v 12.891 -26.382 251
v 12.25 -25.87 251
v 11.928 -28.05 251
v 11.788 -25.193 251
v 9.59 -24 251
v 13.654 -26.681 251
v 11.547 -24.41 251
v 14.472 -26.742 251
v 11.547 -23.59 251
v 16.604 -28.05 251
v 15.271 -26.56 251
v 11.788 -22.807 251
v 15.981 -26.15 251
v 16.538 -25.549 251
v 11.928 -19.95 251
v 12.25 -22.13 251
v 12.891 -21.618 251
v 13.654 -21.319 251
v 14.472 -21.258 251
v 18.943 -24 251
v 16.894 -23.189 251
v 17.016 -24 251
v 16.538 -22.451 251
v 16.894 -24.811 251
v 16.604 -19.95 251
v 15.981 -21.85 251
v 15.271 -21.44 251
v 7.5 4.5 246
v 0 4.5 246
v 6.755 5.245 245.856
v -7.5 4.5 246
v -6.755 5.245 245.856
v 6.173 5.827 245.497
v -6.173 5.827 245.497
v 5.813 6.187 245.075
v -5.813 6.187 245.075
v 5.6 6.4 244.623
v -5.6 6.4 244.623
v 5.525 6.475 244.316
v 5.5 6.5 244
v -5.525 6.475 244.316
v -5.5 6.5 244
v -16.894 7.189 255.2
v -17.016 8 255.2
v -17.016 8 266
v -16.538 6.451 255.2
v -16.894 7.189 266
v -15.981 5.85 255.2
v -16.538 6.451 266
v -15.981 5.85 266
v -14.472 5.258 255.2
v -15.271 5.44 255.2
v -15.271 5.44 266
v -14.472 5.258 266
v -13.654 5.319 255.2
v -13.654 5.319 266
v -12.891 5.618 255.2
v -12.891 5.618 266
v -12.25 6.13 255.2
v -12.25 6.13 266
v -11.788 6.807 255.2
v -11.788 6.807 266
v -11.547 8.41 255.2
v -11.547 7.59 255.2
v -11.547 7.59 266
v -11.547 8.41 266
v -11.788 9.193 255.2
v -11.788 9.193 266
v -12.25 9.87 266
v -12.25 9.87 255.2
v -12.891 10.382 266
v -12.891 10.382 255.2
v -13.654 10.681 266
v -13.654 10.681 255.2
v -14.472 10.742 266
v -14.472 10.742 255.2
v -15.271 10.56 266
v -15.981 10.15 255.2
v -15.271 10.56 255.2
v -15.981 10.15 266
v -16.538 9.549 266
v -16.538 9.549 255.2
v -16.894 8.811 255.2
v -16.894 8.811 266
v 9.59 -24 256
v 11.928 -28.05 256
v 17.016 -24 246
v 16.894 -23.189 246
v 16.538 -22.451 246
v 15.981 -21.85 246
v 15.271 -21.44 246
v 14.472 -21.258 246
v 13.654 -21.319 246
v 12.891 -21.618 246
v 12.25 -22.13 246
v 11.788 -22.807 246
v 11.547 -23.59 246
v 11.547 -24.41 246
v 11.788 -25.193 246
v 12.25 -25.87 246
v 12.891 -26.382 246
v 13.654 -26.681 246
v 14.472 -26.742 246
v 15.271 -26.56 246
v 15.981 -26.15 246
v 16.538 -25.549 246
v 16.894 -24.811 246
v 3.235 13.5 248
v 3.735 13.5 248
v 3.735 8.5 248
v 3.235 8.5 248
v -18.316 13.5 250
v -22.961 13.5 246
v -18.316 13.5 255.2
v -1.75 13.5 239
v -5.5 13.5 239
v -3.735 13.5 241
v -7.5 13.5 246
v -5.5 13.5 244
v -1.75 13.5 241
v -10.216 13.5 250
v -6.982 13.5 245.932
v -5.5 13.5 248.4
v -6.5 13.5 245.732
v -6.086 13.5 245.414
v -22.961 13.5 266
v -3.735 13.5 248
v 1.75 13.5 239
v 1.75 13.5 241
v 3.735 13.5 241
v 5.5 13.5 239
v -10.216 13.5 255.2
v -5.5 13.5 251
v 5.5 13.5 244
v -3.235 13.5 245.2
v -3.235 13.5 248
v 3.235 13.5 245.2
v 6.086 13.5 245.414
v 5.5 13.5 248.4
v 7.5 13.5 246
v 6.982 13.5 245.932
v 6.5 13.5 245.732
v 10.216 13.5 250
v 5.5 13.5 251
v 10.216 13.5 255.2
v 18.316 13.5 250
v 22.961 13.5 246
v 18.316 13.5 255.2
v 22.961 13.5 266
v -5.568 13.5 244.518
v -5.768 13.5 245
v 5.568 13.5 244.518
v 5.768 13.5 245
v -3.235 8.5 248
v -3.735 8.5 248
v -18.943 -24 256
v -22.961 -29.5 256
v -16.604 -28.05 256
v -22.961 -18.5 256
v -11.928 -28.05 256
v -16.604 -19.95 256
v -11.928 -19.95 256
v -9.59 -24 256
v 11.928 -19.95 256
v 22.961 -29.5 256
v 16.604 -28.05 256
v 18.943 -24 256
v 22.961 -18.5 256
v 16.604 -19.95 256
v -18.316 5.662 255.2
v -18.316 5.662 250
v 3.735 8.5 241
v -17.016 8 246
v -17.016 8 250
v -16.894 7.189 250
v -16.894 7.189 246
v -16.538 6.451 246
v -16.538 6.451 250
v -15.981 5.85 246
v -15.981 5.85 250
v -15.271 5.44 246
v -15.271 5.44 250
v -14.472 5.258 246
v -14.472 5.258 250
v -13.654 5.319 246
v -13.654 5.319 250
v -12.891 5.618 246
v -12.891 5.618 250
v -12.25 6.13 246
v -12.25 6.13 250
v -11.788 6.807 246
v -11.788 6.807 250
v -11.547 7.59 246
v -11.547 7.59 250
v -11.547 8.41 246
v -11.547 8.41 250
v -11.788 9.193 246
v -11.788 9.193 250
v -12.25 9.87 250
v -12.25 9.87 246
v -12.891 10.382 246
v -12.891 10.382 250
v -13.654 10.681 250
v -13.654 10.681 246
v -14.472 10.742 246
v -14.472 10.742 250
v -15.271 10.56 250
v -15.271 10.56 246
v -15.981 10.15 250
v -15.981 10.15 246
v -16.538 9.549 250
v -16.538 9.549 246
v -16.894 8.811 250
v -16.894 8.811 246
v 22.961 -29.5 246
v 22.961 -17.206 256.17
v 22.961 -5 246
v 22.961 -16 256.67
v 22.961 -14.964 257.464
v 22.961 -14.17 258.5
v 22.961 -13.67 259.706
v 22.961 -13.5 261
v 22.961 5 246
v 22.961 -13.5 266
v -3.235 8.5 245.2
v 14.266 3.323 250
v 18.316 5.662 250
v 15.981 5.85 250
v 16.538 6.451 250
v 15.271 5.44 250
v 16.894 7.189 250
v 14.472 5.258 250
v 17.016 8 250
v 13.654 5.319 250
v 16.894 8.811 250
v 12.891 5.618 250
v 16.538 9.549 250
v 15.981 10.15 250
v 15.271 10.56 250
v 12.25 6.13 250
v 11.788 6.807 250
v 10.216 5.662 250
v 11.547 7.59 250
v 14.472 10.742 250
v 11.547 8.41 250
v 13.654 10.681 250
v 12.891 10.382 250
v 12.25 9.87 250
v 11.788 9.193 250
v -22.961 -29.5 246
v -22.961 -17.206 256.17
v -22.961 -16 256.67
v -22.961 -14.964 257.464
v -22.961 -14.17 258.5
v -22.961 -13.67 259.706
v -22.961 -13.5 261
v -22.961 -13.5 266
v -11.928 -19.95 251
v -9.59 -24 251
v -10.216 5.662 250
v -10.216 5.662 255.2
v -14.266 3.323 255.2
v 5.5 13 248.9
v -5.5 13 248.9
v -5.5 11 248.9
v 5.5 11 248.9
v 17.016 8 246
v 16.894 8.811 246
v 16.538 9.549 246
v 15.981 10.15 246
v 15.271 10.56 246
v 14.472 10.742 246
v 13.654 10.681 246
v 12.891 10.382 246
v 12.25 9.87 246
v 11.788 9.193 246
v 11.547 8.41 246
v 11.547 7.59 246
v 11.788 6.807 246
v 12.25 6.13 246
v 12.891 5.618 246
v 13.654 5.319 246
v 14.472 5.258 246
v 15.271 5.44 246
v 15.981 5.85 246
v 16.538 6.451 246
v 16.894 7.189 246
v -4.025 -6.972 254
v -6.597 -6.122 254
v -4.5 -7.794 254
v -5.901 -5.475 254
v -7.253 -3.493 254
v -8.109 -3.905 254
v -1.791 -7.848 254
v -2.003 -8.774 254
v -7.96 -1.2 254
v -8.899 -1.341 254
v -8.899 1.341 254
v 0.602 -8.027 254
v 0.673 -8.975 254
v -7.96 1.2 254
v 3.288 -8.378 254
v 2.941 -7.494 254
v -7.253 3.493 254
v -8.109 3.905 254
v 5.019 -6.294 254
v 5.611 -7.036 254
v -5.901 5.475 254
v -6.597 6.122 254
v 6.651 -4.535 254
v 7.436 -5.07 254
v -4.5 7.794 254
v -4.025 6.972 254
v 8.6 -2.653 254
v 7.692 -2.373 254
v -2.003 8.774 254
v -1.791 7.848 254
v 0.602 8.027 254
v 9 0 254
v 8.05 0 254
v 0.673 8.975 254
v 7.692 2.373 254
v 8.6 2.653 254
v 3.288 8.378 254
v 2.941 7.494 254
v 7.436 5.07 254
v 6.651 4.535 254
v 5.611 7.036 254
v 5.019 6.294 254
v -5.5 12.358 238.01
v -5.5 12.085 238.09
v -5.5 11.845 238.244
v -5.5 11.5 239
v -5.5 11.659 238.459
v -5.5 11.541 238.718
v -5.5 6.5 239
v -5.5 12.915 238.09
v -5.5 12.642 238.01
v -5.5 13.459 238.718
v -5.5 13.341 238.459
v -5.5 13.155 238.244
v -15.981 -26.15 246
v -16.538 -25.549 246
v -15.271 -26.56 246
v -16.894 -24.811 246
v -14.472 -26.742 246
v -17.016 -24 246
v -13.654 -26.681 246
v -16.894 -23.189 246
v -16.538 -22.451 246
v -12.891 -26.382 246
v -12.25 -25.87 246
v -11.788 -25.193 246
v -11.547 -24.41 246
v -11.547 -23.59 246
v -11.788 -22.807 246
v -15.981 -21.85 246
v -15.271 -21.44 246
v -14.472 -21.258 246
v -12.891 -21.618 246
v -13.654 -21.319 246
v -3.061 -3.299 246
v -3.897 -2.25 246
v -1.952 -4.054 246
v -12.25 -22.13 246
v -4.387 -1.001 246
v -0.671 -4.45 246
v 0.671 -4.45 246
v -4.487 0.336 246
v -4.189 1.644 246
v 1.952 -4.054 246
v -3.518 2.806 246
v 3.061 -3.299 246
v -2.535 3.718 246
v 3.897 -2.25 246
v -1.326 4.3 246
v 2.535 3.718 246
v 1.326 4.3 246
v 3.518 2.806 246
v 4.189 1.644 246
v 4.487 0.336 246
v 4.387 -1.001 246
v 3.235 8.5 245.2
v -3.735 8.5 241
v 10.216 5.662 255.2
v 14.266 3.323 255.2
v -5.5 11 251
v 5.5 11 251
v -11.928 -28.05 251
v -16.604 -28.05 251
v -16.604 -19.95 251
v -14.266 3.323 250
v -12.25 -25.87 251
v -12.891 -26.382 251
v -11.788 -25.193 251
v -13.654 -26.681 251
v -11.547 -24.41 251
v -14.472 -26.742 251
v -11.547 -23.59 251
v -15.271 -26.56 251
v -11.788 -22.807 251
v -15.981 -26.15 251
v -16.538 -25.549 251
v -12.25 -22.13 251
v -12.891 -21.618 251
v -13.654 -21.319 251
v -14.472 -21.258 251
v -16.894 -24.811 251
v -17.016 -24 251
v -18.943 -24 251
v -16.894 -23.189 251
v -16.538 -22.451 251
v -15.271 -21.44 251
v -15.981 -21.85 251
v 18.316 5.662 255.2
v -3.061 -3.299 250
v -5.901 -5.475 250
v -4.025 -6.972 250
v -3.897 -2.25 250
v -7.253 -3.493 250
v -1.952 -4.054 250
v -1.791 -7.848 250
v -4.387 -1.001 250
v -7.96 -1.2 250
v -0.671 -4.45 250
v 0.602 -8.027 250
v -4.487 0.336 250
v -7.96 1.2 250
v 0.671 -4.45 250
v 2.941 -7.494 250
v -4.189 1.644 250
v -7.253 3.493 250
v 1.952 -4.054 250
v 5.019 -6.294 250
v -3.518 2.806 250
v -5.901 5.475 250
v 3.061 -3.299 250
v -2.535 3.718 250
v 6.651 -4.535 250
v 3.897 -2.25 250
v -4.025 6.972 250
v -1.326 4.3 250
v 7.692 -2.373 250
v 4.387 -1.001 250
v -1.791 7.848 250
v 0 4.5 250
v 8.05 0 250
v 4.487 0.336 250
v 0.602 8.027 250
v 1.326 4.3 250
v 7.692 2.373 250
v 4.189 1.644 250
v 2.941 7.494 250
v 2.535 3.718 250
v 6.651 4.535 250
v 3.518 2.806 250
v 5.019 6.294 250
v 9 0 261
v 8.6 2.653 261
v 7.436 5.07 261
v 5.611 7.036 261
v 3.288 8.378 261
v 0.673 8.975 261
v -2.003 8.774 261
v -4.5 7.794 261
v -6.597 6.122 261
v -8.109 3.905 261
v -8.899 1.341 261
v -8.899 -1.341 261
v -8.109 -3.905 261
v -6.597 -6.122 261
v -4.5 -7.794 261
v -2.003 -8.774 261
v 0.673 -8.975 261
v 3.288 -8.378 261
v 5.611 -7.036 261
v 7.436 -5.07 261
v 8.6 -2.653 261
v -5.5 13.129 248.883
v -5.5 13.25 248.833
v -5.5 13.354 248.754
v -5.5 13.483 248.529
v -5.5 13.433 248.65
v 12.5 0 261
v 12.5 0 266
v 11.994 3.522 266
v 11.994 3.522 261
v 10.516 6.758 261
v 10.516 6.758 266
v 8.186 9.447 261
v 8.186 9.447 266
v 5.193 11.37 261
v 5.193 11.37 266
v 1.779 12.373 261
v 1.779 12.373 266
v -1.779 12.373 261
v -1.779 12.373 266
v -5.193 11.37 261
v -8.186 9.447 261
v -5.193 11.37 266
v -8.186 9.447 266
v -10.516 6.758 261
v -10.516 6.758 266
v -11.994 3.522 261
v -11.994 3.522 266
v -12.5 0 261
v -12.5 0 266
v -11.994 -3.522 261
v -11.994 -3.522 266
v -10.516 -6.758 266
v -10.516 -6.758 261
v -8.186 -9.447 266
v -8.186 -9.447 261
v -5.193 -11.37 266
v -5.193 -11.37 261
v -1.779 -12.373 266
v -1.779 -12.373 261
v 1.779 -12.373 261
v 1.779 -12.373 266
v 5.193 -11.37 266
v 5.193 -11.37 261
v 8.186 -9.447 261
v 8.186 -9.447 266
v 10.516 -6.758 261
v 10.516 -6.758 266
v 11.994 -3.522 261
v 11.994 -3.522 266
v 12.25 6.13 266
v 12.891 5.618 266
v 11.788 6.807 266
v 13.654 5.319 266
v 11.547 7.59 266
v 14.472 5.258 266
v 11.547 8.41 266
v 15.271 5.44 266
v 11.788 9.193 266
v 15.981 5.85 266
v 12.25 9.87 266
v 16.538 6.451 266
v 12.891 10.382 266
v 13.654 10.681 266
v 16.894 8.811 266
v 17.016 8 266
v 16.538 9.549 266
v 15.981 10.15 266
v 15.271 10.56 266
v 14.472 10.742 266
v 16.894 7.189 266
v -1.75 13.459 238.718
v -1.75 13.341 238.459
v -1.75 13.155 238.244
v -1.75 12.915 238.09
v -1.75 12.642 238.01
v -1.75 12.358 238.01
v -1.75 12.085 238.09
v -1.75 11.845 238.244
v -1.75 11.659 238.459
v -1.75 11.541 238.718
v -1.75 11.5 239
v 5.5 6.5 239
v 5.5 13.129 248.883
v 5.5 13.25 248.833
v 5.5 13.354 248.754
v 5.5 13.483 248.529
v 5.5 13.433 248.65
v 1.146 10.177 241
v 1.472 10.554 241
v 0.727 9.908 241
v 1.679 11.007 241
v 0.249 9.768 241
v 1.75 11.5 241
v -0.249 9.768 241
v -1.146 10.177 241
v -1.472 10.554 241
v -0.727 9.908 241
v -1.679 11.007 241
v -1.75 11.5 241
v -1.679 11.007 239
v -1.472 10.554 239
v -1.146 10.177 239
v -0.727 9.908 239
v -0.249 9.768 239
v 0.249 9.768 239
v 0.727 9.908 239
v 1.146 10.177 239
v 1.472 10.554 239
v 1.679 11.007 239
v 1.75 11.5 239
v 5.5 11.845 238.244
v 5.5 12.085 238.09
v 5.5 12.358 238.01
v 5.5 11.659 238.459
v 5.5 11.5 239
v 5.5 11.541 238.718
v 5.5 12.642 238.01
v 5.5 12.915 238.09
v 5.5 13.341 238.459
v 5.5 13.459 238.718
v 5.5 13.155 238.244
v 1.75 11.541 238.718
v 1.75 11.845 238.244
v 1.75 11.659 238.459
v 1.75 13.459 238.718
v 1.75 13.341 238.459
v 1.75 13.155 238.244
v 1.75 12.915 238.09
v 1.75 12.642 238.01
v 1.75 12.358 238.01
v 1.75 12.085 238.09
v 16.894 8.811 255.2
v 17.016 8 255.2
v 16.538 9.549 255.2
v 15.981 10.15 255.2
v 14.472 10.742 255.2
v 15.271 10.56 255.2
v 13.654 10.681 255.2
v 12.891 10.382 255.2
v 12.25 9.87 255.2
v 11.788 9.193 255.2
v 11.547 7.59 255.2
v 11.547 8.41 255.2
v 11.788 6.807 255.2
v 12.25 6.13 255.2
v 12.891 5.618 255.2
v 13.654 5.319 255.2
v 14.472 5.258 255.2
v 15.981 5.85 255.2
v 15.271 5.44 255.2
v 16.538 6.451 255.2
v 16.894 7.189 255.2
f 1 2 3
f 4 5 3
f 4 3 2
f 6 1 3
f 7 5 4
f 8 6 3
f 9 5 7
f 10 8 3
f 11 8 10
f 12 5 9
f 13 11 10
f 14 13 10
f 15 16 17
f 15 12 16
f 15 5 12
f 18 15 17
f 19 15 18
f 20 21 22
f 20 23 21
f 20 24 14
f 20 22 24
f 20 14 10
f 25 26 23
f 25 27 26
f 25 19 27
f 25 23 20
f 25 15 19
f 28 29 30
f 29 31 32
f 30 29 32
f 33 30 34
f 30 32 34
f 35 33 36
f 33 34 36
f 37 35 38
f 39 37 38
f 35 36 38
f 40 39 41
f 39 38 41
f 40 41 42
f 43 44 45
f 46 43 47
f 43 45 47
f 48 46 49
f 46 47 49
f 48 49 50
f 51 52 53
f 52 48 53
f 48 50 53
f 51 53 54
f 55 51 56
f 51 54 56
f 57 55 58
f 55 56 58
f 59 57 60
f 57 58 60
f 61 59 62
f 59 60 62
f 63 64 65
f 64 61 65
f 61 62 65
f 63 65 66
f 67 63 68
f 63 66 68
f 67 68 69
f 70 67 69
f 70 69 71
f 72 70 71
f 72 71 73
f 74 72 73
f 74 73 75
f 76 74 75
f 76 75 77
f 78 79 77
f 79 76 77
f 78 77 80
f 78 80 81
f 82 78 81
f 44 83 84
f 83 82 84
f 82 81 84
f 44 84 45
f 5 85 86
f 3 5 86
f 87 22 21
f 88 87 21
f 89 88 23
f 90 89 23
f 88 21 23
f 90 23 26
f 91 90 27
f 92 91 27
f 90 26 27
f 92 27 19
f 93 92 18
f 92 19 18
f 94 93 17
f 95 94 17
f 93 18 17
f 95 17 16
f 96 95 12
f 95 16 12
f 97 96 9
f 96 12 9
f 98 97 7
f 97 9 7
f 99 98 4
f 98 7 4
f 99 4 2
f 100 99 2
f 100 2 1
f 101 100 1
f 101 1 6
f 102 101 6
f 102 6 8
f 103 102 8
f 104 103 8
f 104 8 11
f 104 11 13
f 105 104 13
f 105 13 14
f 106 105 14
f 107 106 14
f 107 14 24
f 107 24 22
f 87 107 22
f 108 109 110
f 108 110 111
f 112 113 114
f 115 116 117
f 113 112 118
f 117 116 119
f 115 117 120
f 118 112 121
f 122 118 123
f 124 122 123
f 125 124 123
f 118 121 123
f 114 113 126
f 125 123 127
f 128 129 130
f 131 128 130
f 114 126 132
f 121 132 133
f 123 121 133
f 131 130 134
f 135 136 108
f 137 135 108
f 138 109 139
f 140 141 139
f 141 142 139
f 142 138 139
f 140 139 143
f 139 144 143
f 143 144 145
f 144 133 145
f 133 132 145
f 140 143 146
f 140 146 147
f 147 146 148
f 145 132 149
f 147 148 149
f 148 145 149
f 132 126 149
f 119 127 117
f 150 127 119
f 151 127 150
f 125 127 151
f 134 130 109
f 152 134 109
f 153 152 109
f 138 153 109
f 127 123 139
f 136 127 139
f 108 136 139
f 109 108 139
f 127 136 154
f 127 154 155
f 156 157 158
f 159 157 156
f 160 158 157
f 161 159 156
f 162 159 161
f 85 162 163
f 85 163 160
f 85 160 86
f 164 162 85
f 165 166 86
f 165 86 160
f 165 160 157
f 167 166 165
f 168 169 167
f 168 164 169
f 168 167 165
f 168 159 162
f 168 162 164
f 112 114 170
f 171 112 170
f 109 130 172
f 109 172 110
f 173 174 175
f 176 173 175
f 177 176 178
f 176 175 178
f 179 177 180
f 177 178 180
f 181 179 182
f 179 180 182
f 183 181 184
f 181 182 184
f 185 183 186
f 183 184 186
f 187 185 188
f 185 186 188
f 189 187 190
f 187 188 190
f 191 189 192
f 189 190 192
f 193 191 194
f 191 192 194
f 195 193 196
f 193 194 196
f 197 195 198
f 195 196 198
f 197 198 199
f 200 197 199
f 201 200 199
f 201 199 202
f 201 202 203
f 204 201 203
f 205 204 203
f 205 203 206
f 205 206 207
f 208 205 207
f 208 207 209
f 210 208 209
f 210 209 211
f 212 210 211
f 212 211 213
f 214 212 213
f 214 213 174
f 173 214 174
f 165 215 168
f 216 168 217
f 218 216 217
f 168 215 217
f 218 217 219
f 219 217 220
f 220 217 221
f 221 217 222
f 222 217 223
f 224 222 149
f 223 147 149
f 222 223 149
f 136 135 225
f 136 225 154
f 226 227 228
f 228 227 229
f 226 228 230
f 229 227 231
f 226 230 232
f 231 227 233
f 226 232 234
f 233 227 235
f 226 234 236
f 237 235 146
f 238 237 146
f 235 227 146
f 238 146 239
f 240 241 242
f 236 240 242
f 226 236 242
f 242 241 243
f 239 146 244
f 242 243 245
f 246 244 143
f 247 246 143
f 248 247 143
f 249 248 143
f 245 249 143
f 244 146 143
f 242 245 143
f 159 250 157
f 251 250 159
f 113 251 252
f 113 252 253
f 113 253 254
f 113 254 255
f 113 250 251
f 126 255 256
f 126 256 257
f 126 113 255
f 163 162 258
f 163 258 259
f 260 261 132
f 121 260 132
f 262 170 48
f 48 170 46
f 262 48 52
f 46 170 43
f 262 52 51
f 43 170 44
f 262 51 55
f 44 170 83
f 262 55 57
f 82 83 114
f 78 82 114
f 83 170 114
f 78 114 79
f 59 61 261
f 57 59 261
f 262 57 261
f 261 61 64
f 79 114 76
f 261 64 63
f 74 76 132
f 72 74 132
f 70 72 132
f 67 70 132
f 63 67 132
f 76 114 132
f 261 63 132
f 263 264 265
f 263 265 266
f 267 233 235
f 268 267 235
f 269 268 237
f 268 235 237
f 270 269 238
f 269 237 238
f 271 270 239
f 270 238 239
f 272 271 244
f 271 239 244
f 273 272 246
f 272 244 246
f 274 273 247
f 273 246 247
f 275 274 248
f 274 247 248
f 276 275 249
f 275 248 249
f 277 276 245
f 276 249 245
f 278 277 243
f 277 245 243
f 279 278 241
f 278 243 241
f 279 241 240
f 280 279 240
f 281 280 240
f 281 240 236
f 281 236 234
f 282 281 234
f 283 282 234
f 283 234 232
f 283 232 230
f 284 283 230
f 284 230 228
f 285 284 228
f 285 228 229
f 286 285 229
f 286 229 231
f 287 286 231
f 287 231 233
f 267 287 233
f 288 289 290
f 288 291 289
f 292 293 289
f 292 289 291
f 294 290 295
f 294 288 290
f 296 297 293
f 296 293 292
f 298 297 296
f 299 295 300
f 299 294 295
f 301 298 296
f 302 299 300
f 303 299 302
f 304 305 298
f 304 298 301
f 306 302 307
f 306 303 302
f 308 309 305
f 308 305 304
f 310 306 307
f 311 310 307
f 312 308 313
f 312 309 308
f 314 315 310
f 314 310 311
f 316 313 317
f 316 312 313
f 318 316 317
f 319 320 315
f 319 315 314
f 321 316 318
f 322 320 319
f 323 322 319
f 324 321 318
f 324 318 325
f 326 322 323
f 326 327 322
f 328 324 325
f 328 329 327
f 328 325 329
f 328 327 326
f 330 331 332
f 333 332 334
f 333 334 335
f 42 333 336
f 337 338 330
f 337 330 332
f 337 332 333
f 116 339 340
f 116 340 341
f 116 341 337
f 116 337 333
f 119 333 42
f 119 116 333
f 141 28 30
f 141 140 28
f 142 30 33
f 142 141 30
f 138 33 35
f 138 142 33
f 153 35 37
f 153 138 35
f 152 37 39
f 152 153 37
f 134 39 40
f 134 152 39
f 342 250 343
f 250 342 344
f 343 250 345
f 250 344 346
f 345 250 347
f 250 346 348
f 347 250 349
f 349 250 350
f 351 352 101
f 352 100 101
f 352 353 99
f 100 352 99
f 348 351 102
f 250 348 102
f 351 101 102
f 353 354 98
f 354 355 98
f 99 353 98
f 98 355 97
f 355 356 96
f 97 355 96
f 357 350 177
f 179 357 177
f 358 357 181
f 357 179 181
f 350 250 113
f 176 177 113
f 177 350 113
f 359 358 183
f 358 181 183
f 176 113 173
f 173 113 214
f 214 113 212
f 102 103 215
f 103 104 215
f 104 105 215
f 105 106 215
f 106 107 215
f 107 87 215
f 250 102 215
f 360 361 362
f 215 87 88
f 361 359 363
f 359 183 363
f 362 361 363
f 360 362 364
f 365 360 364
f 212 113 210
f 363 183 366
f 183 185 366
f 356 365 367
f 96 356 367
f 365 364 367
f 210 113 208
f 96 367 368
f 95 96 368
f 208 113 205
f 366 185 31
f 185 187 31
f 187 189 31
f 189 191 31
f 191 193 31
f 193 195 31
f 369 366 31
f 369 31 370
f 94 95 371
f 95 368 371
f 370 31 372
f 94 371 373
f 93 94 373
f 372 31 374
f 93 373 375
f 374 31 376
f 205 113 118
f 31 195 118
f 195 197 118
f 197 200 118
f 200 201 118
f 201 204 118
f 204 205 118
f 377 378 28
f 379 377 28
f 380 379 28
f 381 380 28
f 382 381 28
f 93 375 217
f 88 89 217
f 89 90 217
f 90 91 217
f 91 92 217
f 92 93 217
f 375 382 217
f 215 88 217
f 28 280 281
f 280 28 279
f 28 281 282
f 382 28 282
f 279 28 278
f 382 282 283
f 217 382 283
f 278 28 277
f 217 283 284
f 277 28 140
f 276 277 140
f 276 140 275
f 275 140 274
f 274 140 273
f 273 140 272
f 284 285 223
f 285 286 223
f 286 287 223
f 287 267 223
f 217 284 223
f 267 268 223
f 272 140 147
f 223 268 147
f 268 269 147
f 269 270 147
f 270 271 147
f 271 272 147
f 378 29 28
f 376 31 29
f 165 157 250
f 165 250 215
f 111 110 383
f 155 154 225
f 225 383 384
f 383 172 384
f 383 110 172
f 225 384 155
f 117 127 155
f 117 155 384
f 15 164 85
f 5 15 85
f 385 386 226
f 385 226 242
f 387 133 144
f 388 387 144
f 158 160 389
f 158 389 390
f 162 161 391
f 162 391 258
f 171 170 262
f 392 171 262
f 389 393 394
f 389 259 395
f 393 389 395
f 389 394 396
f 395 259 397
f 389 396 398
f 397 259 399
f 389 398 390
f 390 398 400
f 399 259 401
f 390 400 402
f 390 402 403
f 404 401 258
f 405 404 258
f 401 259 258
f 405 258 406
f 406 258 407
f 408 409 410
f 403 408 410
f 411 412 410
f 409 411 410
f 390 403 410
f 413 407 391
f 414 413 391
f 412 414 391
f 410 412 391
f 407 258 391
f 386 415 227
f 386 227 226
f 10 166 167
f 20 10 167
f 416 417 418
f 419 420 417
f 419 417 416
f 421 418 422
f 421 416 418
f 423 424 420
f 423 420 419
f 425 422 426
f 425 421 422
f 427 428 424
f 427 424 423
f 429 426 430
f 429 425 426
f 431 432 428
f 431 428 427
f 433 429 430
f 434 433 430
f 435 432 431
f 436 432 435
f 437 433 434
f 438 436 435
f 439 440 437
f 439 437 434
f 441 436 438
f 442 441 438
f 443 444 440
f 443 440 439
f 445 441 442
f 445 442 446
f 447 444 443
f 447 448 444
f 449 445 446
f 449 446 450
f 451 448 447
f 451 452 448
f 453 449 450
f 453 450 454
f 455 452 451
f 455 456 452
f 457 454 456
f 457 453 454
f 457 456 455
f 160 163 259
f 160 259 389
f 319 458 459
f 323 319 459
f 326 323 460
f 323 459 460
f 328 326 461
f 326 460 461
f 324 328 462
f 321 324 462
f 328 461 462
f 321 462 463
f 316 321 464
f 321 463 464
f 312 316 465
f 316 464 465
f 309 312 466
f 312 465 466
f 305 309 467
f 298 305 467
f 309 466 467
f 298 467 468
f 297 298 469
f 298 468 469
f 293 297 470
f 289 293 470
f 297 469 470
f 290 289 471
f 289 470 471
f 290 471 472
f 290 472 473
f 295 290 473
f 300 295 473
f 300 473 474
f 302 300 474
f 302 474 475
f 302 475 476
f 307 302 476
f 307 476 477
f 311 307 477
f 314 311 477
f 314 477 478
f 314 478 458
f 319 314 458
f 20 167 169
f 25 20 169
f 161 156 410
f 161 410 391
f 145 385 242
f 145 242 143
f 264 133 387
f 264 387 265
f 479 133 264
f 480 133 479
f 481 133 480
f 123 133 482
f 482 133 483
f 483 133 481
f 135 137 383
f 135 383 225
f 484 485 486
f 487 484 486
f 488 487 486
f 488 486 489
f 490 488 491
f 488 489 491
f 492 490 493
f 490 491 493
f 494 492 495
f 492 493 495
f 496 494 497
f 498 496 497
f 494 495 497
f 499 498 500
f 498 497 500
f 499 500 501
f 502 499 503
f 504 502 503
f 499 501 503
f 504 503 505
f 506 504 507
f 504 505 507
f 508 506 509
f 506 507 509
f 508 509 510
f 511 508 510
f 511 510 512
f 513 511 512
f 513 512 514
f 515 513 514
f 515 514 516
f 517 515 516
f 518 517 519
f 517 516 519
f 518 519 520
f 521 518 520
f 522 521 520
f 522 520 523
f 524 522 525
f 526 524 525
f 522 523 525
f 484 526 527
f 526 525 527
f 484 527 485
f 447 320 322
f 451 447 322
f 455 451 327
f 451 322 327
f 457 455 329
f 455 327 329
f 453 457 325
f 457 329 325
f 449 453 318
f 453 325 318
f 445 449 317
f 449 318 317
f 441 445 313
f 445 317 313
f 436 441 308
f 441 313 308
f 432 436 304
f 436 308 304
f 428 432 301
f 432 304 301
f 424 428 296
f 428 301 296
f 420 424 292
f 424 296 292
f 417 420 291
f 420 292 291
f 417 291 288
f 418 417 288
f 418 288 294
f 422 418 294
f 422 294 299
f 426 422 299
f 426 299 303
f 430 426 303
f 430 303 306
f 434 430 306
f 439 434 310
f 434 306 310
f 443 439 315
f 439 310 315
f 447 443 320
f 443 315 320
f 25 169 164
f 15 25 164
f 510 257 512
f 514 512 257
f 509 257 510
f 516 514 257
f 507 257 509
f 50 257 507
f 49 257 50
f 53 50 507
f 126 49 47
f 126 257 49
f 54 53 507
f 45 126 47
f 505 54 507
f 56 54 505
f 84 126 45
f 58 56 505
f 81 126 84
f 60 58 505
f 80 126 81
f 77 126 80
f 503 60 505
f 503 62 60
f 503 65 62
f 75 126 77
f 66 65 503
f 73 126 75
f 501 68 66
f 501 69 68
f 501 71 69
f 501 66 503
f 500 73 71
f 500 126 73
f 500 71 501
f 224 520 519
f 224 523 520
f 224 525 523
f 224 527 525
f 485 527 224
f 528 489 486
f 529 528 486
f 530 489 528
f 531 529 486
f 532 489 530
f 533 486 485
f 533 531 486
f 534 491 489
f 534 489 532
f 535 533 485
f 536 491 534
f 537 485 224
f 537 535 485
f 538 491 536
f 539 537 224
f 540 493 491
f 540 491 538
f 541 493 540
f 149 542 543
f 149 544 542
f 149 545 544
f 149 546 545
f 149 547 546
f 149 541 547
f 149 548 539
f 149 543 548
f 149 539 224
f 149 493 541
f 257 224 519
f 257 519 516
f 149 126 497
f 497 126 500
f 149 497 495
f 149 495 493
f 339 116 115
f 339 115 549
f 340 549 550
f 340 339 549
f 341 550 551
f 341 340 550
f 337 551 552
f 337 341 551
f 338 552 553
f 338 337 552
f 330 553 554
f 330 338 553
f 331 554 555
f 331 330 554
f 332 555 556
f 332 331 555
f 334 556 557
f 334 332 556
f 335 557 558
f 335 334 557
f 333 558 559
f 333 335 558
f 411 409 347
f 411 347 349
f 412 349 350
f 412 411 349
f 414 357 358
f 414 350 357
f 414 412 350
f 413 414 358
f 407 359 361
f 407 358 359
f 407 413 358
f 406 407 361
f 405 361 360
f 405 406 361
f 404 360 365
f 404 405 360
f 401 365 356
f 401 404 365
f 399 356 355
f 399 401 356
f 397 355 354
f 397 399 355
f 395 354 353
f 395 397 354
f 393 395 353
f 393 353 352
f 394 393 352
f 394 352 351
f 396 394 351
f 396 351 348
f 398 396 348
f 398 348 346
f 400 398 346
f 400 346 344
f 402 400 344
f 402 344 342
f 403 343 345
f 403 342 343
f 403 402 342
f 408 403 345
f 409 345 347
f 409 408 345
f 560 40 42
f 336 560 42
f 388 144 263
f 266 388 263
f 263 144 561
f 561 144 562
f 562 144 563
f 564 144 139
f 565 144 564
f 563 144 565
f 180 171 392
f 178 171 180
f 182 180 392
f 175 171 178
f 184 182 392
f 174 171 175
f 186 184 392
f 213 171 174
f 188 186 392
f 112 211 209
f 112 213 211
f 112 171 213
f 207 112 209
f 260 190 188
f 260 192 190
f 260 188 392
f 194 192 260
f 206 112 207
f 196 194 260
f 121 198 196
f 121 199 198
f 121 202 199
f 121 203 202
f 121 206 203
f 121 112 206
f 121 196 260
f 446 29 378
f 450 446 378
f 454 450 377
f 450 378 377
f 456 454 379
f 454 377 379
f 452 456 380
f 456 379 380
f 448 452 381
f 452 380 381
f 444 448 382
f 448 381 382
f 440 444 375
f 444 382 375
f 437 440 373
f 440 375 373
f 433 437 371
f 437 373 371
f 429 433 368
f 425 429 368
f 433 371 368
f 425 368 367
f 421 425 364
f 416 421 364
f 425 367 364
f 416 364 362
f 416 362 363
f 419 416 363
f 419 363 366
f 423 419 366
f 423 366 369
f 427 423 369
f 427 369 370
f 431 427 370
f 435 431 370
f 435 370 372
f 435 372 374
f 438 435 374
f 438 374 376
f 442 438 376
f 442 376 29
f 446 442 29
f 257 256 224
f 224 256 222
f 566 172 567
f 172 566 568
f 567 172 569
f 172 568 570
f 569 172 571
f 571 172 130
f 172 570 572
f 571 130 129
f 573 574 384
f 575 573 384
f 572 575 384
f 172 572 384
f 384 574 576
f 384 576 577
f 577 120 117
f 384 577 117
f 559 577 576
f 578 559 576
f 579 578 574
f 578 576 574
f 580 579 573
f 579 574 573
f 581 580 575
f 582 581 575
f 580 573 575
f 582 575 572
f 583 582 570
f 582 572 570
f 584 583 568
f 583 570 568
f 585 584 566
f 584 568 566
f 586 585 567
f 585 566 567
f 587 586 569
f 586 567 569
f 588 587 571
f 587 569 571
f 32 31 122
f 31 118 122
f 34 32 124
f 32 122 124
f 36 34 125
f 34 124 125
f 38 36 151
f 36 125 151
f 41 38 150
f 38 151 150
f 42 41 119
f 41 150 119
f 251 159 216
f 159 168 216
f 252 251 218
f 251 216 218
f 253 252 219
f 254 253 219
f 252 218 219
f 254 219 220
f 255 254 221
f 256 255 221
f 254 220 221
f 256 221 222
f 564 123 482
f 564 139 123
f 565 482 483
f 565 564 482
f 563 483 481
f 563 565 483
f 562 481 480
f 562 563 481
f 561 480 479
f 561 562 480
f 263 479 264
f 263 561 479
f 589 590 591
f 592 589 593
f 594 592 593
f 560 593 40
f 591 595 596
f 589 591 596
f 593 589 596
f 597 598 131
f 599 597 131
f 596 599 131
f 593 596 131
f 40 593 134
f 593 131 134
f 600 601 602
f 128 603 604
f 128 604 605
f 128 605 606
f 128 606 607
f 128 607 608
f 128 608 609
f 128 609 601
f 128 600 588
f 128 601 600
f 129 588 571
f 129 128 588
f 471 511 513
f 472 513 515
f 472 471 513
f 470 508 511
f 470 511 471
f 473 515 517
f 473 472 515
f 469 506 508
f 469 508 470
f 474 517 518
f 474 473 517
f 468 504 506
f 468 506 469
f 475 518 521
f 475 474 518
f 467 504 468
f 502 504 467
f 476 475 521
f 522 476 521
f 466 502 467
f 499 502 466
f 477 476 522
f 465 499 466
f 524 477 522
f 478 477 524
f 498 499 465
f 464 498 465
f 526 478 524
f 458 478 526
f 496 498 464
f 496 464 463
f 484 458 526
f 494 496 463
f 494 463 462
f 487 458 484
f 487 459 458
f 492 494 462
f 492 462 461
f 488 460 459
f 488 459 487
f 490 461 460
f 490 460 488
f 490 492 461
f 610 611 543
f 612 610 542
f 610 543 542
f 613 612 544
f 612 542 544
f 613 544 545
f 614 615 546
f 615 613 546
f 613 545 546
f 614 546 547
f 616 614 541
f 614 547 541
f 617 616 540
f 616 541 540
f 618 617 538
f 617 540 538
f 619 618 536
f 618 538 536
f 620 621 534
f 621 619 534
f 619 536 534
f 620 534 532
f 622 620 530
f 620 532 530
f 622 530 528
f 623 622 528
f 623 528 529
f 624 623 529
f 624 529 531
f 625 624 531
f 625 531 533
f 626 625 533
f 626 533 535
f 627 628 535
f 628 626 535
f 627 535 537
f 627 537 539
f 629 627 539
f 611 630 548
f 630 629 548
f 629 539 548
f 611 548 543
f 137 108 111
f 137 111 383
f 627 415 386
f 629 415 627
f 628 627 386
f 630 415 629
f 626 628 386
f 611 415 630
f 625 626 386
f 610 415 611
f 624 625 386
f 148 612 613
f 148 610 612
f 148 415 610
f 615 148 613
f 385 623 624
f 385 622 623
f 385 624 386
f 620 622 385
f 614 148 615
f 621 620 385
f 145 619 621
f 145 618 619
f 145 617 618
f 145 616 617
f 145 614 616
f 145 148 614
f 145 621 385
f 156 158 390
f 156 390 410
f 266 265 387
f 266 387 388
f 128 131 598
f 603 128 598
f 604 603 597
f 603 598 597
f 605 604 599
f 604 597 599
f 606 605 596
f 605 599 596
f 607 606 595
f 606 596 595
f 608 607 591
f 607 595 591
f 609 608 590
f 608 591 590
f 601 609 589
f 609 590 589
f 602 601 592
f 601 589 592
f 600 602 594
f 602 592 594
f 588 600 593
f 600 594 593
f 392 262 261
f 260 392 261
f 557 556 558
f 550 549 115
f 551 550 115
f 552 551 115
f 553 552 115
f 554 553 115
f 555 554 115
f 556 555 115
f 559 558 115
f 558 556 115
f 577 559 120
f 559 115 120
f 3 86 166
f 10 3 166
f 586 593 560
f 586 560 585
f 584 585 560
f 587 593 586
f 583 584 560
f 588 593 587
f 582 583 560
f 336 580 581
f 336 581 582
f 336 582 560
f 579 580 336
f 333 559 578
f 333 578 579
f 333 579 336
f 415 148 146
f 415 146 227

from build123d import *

# Parameters (mm, degrees)
BOSS_EXTRUDE1_DEPTH      = 13.5
BOSS_EXTRUDE2_DEPTH      = 18.5
BOSS_EXTRUDE3_DEPTH      = 5
SKETCH4_W                = 45.922011884
SKETCH4_H                = 20
BOSS_EXTRUDE4_DEPTH      = 13.5
SKETCH2_R                = 4.25
CUT_EXTRUDE1_DEPTH       = 268.629329099
SKETCH6_R                = 9
CUT_EXTRUDE3_DEPTH       = 12
SKETCH7_R                = 12.5
CUT_EXTRUDE4_DEPTH       = 5
BOSS_EXTRUDE5_DEPTH      = 13.5
CUT_EXTRUDE5_REACH       = 210.1
SKETCH8_R                = 9
CUT_EXTRUDE6_REACH       = 210.1
SKETCH10_R               = 4
SKETCH11_R               = 8
CUT_EXTRUDE7_DEPTH       = 4
SKETCH18_R               = 11
CUT_EXTRUDE9_DEPTH       = 47
CUT_EXTRUDE11_DEPTH      = 268.629329099
CUT_EXTRUDE11_DEPTH_BACK = 268.629329099
SKETCH20_W               = 45.922011884
SKETCH20_H               = 204.425421037
SKETCH21_W               = 45.922011884
SKETCH21_H               = 10
BOSS_EXTRUDE6_DEPTH      = 16
M5_CLEARANCE_HOLE1_D     = 5.5
CUT_EXTRUDE12_DEPTH      = 5
FILLET1_R                = 5
LPATTERN2_COPY_1_D       = 5.5
LPATTERN2_COPY_2_D       = 5.5
CUT_EXTRUDE13_START      = -9.2
SKETCH25_R               = 2.75
CUT_EXTRUDE13_DEPTH      = 5.2
SKETCH26_R               = 8.05
CUT_EXTRUDE14_DEPTH      = 4
SKETCH27_W               = 11
SKETCH27_H               = 7
BOSS_EXTRUDE7_DEPTH      = 5
CUT_EXTRUDE15_DEPTH      = 5
FILLET2_R                = 2
BOSS_EXTRUDE8_DEPTH      = 2
BOSS_EXTRUDE9_DEPTH      = 3.75
SKETCH31_W               = 11
SKETCH31_H               = 2.1
CUT_EXTRUDE16_DEPTH      = 2.5
FILLET3_R                = 0.5
CUT_EXTRUDE17_REACH      = 44.396
SKETCH32_R               = 4.5


with BuildPart() as part:
    # Sketch1 → Boss-Extrude1 (new, symmetric)
    with BuildSketch(Plane(origin=(0, 0, 0), x_dir=(1, 0, 0), z_dir=(0, 1, 0))):
        with BuildLine():
            ThreePointArc((17.220754456, -41.574578963), (0, -45), (-17.220754456, -41.574578963))
            Line((-17.220754456, -41.574578963), (-22.961005942, -55.432771951))
            ThreePointArc((-22.961005942, -55.432771951), (0, -60), (22.961005942, -55.432771951))
            Line((22.961005942, -55.432771951), (17.220754456, -41.574578963))
        make_face()
    extrude(amount=BOSS_EXTRUDE1_DEPTH, both=True)

    # Sketch1<3> → Boss-Extrude2 (add, symmetric)
    with BuildSketch(Plane(origin=(0, 0, 0), x_dir=(1, 0, 0), z_dir=(0, 1, 0))):
        with BuildLine():
            ThreePointArc((19.134171618, -46.193976626), (0, -50), (-19.134171618, -46.193976626))
            Line((-19.134171618, -46.193976626), (-21.04758878, -50.813374288))
            ThreePointArc((-21.04758878, -50.813374288), (0, -55), (21.04758878, -50.813374288))
            Line((21.04758878, -50.813374288), (19.134171618, -46.193976626))
        make_face()
    extrude(amount=BOSS_EXTRUDE2_DEPTH, both=True)

    # Sketch3 → Boss-Extrude3 (add, symmetric)
    with BuildSketch(Plane.XZ):
        with BuildLine():
            Line((-22.961005942, 266), (-22.961005942, 55.432771951))
            ThreePointArc((-22.961005942, 55.432771951), (-20.481139434, 56.39612511), (-17.961005942, 57.248600555))
            Line((-17.961005942, 57.248600555), (-17.961005942, 246))
            Line((-17.961005942, 246), (17.961005942, 246))
            Line((17.961005942, 246), (17.961005942, 57.248600555))
            ThreePointArc((17.961005942, 57.248600555), (20.481139434, 56.39612511), (22.961005942, 55.432771951))
            Line((22.961005942, 55.432771951), (22.961005942, 266))
            Line((22.961005942, 266), (-22.961005942, 266))
        make_face()
    extrude(amount=BOSS_EXTRUDE3_DEPTH, both=True)

    # Sketch4 → Boss-Extrude4 (add, symmetric)
    with BuildSketch(Plane(origin=(0, 0, 0), x_dir=(1, 0, 0), z_dir=(0, 1, 0))):
        with Locations((0, -256)):
            Rectangle(SKETCH4_W, SKETCH4_H)
    extrude(amount=BOSS_EXTRUDE4_DEPTH, both=True)

    # Sketch2 → Cut-Extrude1 (cut, through all)
    with BuildSketch(Plane.XY):
        Circle(SKETCH2_R)
    extrude(amount=CUT_EXTRUDE1_DEPTH, mode=Mode.SUBTRACT)

    # Sketch6 → Cut-Extrude3 (cut)
    with BuildSketch(Plane.XY.offset(266)):
        Circle(SKETCH6_R)
    extrude(amount=-CUT_EXTRUDE3_DEPTH, mode=Mode.SUBTRACT)

    # Sketch7 → Cut-Extrude4 (cut)
    with BuildSketch(Plane.XY.offset(266)):
        Circle(SKETCH7_R)
    extrude(amount=-CUT_EXTRUDE4_DEPTH, mode=Mode.SUBTRACT)

    # Sketch9 → Boss-Extrude5 (add, symmetric)
    with BuildSketch(Plane(origin=(0, 0, 0), x_dir=(1, 0, 0), z_dir=(0, 1, 0))):
        with BuildLine():
            Line((-22.961005942, -55.432771951), (-22.961005942, -68))
            Line((-22.961005942, -68), (22.961005942, -68))
            Line((22.961005942, -68), (22.961005942, -55.432771951))
            ThreePointArc((22.961005942, -55.432771951), (0, -60), (-22.961005942, -55.432771951))
        make_face()
    extrude(amount=BOSS_EXTRUDE5_DEPTH, both=True)

    # Sketch8 → Cut-Extrude5 (cut, up to next)
    with BuildSketch(Plane.XY.offset(60), mode=Mode.PRIVATE) as cut_extrude5_sk1:
        Circle(SKETCH8_R)
    cut_extrude5_tool1 = extrude(cut_extrude5_sk1.sketch, amount=-CUT_EXTRUDE5_REACH, mode=Mode.PRIVATE) & part.part
    add(cut_extrude5_tool1.solids().sort_by_distance((0, 0, 60))[0], mode=Mode.SUBTRACT)

    # Sketch10 → Cut-Extrude6 (cut, up to next)
    with BuildSketch(Plane.XY.offset(60), mode=Mode.PRIVATE) as cut_extrude6_sk1:
        Circle(SKETCH10_R)
    cut_extrude6_tool1 = extrude(cut_extrude6_sk1.sketch, amount=CUT_EXTRUDE6_REACH, mode=Mode.PRIVATE) & part.part
    add(cut_extrude6_tool1.solids().sort_by_distance((0, 0, 60))[0], mode=Mode.SUBTRACT)

    # Sketch11 → Cut-Extrude7 (cut)
    with BuildSketch(Plane.XY.offset(68)):
        Circle(SKETCH11_R)
    extrude(amount=-CUT_EXTRUDE7_DEPTH, mode=Mode.SUBTRACT)

    # Sketch18 → Cut-Extrude9 (cut)
    with BuildSketch(Plane.XY):
        Circle(SKETCH18_R)
    extrude(amount=CUT_EXTRUDE9_DEPTH, mode=Mode.SUBTRACT)

    # Sketch20 → Cut-Extrude11 (cut, two sides: drawn at the far end of the back side and taken through both)
    with BuildSketch(Plane(origin=(0, 0, 0), x_dir=(1, 0, 0), z_dir=(0, 1, 0)).offset(-CUT_EXTRUDE11_DEPTH_BACK)):
        with Locations((0, -143.787289482)):
            Rectangle(SKETCH20_W, SKETCH20_H)
    extrude(amount=CUT_EXTRUDE11_DEPTH + CUT_EXTRUDE11_DEPTH_BACK, mode=Mode.SUBTRACT)

    # Sketch21 → Boss-Extrude6 (add)
    with BuildSketch(Plane.XZ.offset(13.5)):
        with Locations((0, 251)):
            Rectangle(SKETCH21_W, SKETCH21_H)
    extrude(amount=BOSS_EXTRUDE6_DEPTH)

    # M5 Clearance Hole1 (through all)
    with Locations(Plane(origin=(0, 0, 246), x_dir=(-1, 0, 0), z_dir=(0, 0, -1))):
        with Locations((-14.26606865, -24)):
            m5_clearance_hole1 = Hole(M5_CLEARANCE_HOLE1_D / 2)

    # Sketch24 → Cut-Extrude12 (cut)
    with BuildSketch(Plane.XY.offset(256)):
        Polygon((18.94260583, -24), (16.60433724, -19.95), (11.92780006, -19.95), (9.58953147, -24), (11.92780006, -28.05), (16.60433724, -28.05), align=None)
    cut_extrude12 = extrude(amount=-CUT_EXTRUDE12_DEPTH, mode=Mode.SUBTRACT)

    # Mirror1: M5 Clearance Hole1 across plane
    add(m5_clearance_hole1.mirror(Plane(origin=(0, 0, 0), x_dir=(0, 0, 1), z_dir=(1, 0, 0))), mode=Mode.SUBTRACT)

    # Mirror2: Cut-Extrude12 across plane
    add(cut_extrude12.mirror(Plane(origin=(0, 0, 0), x_dir=(0, 0, 1), z_dir=(1, 0, 0))), mode=Mode.SUBTRACT)

    # Fillet1
    fillet1_edges = [part.edges().sort_by_distance(p)[0] for p in [
        (0, -13.5, 256),
    ]]
    fillet(fillet1_edges, radius=FILLET1_R)

    # LPattern2 copy 1 (through all)
    with Locations(Plane(origin=(0, 32, 246), x_dir=(1, 0, 0), z_dir=(0, 0, -1))):
        with Locations((-14.26606865, 24)):
            Hole(LPATTERN2_COPY_1_D / 2)

    # LPattern2 copy 2 (through all)
    with Locations(Plane(origin=(0, 32, 246), x_dir=(-1, 0, 0), z_dir=(0, 0, -1))):
        with Locations((-14.26606865, -24)):
            Hole(LPATTERN2_COPY_2_D / 2)

    # Sketch25 → Cut-Extrude13 (cut)
    with BuildSketch(Plane(origin=(0, 0, 246), x_dir=(-1, 0, 0), z_dir=(0, 0, -1)).offset(CUT_EXTRUDE13_START)):
        Polygon((-10.21606865, 5.66173141), (-10.21606865, 13.5), (-18.31606865, 13.5), (-18.31606865, 5.66173141), (-14.26606865, 3.32346282), align=None)
        with Locations((-14.26606865, 8)):
            Circle(SKETCH25_R, mode=Mode.SUBTRACT)
    cut_extrude13 = extrude(amount=CUT_EXTRUDE13_DEPTH, mode=Mode.SUBTRACT)

    # Mirror3: Cut-Extrude13 across plane
    add(cut_extrude13.mirror(Plane(origin=(0, 0, 0), x_dir=(0, 0, 1), z_dir=(1, 0, 0))), mode=Mode.SUBTRACT)

    # Sketch26 → Cut-Extrude14 (cut)
    with BuildSketch(Plane.XY.offset(254)):
        Circle(SKETCH26_R)
    extrude(amount=-CUT_EXTRUDE14_DEPTH, mode=Mode.SUBTRACT)

    # Sketch27 → Boss-Extrude7 (add)
    with BuildSketch(Plane(origin=(0, 0, 246), x_dir=(-1, 0, 0), z_dir=(0, 0, -1))):
        with Locations((0, 10)):
            Rectangle(SKETCH27_W, SKETCH27_H)
    extrude(amount=BOSS_EXTRUDE7_DEPTH)

    # Sketch28 → Cut-Extrude15 (cut)
    with BuildSketch(Plane(origin=(0, 13.5, 0), x_dir=(1, 0, 0), z_dir=(0, 1, 0))):
        Polygon((-3.735, -241), (3.735, -241), (3.735, -248), (3.235, -248), (3.235, -245.2), (-3.235, -245.2), (-3.235, -248), (-3.735, -248), align=None)
    extrude(amount=-CUT_EXTRUDE15_DEPTH, mode=Mode.SUBTRACT)

    # Fillet2
    fillet2_edges = [part.edges().sort_by_distance(p)[0] for p in [
        (0, 6.5, 246),
        (5.5, 10, 246),
        (-5.5, 10, 246),
    ]]
    fillet(fillet2_edges, radius=FILLET2_R)

    # Sketch29 → Boss-Extrude8 (add)
    with BuildSketch(Plane(origin=(0, 0, 241), x_dir=(-1, 0, 0), z_dir=(0, 0, -1))):
        with BuildLine():
            ThreePointArc((1.75, 11.5), (0, 9.75), (-1.75, 11.5))
            Line((-1.75, 11.5), (-1.75, 13.5))
            Line((-1.75, 13.5), (-5.5, 13.5))
            Line((-5.5, 13.5), (-5.5, 6.5))
            Line((-5.5, 6.5), (5.5, 6.5))
            Line((5.5, 6.5), (5.5, 13.5))
            Line((5.5, 13.5), (1.75, 13.5))
            Line((1.75, 13.5), (1.75, 11.5))
        make_face()
    extrude(amount=BOSS_EXTRUDE8_DEPTH)

    # Sketch30 → Boss-Extrude9 (add)
    with BuildSketch(Plane.ZY.offset(5.5)):
        with BuildLine():
            Line((239, 11.5), (239, 13.5))
            ThreePointArc((239, 13.5), (238, 12.5), (239, 11.5))
        make_face()
    boss_extrude9 = extrude(amount=-BOSS_EXTRUDE9_DEPTH)

    # Mirror4: Boss-Extrude9 across plane
    add(boss_extrude9.mirror(Plane(origin=(0, 0, 0), x_dir=(0, 0, 1), z_dir=(1, 0, 0))))

    # Sketch31 → Cut-Extrude16 (cut)
    with BuildSketch(Plane(origin=(0, 13.5, 0), x_dir=(1, 0, 0), z_dir=(0, 1, 0))):
        with Locations((0, -249.95)):
            Rectangle(SKETCH31_W, SKETCH31_H)
    extrude(amount=-CUT_EXTRUDE16_DEPTH, mode=Mode.SUBTRACT)

    # Fillet3
    fillet3_edges = [part.edges().sort_by_distance(p)[0] for p in [
        (0, 13.5, 248.9),
    ]]
    fillet(fillet3_edges, radius=FILLET3_R)

    # Sketch32 → Cut-Extrude17 (cut, up to next)
    with BuildSketch(Plane(origin=(0, 0, 246), x_dir=(-1, 0, 0), z_dir=(0, 0, -1)), mode=Mode.PRIVATE) as cut_extrude17_sk1:
        Circle(SKETCH32_R)
    cut_extrude17_tool1 = extrude(cut_extrude17_sk1.sketch, amount=-CUT_EXTRUDE17_REACH, mode=Mode.PRIVATE) & part.part
    add(cut_extrude17_tool1.solids().sort_by_distance((0, 0, 246))[0], mode=Mode.SUBTRACT)


solid = part.part
